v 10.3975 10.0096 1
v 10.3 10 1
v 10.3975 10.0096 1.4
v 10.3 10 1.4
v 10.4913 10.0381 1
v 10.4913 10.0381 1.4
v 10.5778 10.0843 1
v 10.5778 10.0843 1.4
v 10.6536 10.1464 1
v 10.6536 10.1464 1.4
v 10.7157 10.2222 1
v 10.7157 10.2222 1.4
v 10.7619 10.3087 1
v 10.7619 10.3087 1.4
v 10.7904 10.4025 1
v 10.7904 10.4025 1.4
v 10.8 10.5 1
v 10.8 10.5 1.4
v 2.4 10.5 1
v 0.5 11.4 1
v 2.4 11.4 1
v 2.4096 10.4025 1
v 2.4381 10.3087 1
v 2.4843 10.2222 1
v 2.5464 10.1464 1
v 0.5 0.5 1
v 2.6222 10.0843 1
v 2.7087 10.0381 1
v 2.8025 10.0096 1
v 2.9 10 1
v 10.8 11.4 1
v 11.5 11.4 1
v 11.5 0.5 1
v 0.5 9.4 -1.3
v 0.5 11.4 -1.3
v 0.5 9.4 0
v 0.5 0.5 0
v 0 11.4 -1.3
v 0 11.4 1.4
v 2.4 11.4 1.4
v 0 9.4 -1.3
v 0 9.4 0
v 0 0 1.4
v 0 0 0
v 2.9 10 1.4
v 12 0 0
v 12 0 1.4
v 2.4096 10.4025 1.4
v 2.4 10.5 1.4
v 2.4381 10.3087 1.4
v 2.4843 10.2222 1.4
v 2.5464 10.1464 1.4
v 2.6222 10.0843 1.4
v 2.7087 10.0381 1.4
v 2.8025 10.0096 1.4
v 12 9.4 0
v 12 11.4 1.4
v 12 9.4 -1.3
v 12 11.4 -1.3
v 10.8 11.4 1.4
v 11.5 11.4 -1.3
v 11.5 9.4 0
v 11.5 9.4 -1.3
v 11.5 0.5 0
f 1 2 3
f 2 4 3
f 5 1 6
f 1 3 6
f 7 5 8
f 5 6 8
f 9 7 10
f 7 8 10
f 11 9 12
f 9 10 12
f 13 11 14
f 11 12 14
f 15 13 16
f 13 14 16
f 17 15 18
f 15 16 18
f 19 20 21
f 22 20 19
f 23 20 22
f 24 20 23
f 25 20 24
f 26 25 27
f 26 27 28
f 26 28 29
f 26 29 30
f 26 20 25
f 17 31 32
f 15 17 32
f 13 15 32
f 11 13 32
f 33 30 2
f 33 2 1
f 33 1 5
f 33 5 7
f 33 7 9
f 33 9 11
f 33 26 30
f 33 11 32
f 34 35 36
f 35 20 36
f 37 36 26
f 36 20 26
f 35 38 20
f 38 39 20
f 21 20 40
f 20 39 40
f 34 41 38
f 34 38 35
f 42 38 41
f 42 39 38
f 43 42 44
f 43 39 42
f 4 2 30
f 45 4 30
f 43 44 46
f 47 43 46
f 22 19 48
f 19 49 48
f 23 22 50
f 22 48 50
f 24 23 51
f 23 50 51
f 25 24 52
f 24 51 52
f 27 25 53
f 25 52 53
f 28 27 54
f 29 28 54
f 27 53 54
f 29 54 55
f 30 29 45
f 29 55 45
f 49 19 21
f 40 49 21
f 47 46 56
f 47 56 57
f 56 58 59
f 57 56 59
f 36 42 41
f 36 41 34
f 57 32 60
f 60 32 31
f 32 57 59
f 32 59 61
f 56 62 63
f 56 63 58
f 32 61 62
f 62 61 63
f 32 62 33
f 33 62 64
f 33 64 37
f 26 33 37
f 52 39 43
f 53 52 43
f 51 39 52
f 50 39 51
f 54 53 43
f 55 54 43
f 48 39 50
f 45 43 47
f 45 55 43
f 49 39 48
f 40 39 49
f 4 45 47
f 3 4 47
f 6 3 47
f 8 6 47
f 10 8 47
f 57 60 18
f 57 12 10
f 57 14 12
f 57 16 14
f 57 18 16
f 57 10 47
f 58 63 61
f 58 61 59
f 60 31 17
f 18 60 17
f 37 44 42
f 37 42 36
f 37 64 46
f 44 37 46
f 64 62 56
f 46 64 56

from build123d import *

# Parameters (mm, degrees)
F1_DEPTH = 1.4
F3_DEPTH = 1
F4_W     = 0.5
F4_H     = 2
F5_DEPTH = 1.3
F6_R     = 0.5


with BuildPart() as f1:
    # F0 (on Top) → F1 (new body)
    with BuildSketch(Plane.XY):
        Polygon((0, 11.4), (0, 0), (12, 0), (12, 11.4), (10.8, 11.4), (10.8, 10), (2.4, 10), (2.4, 11.4), align=None)
    extrude(amount=F1_DEPTH)

    # F2 (on face) → F3 (cut)
    with BuildSketch(Plane(origin=(0, 0, 0), x_dir=(1, 0, 0), z_dir=(0, 0, -1))):
        Polygon((11.5, -0.5), (0.5, -0.5), (0.5, -11.4), (2.4, -11.4), (2.4, -10), (10.8, -10), (10.8, -11.4), (11.5, -11.4), align=None)
    extrude(amount=-F3_DEPTH, mode=Mode.SUBTRACT)

    # F4 (on face) → F5 (join)
    with BuildSketch(Plane(origin=(0, 0, 0), x_dir=(1, 0, 0), z_dir=(0, 0, -1))):
        with Locations((0.25, -10.4)):
            Rectangle(F4_W, F4_H)
        with Locations((11.75, -10.4)):
            Rectangle(F4_W, F4_H)
    extrude(amount=F5_DEPTH)

    # F6
    f6_edges = [f1.edges().sort_by_distance(p)[0] for p in [
        (10.8, 10, 1.2),
        (2.4, 10, 1.2),
    ]]
    fillet(f6_edges, radius=F6_R)


solid = f1.part
